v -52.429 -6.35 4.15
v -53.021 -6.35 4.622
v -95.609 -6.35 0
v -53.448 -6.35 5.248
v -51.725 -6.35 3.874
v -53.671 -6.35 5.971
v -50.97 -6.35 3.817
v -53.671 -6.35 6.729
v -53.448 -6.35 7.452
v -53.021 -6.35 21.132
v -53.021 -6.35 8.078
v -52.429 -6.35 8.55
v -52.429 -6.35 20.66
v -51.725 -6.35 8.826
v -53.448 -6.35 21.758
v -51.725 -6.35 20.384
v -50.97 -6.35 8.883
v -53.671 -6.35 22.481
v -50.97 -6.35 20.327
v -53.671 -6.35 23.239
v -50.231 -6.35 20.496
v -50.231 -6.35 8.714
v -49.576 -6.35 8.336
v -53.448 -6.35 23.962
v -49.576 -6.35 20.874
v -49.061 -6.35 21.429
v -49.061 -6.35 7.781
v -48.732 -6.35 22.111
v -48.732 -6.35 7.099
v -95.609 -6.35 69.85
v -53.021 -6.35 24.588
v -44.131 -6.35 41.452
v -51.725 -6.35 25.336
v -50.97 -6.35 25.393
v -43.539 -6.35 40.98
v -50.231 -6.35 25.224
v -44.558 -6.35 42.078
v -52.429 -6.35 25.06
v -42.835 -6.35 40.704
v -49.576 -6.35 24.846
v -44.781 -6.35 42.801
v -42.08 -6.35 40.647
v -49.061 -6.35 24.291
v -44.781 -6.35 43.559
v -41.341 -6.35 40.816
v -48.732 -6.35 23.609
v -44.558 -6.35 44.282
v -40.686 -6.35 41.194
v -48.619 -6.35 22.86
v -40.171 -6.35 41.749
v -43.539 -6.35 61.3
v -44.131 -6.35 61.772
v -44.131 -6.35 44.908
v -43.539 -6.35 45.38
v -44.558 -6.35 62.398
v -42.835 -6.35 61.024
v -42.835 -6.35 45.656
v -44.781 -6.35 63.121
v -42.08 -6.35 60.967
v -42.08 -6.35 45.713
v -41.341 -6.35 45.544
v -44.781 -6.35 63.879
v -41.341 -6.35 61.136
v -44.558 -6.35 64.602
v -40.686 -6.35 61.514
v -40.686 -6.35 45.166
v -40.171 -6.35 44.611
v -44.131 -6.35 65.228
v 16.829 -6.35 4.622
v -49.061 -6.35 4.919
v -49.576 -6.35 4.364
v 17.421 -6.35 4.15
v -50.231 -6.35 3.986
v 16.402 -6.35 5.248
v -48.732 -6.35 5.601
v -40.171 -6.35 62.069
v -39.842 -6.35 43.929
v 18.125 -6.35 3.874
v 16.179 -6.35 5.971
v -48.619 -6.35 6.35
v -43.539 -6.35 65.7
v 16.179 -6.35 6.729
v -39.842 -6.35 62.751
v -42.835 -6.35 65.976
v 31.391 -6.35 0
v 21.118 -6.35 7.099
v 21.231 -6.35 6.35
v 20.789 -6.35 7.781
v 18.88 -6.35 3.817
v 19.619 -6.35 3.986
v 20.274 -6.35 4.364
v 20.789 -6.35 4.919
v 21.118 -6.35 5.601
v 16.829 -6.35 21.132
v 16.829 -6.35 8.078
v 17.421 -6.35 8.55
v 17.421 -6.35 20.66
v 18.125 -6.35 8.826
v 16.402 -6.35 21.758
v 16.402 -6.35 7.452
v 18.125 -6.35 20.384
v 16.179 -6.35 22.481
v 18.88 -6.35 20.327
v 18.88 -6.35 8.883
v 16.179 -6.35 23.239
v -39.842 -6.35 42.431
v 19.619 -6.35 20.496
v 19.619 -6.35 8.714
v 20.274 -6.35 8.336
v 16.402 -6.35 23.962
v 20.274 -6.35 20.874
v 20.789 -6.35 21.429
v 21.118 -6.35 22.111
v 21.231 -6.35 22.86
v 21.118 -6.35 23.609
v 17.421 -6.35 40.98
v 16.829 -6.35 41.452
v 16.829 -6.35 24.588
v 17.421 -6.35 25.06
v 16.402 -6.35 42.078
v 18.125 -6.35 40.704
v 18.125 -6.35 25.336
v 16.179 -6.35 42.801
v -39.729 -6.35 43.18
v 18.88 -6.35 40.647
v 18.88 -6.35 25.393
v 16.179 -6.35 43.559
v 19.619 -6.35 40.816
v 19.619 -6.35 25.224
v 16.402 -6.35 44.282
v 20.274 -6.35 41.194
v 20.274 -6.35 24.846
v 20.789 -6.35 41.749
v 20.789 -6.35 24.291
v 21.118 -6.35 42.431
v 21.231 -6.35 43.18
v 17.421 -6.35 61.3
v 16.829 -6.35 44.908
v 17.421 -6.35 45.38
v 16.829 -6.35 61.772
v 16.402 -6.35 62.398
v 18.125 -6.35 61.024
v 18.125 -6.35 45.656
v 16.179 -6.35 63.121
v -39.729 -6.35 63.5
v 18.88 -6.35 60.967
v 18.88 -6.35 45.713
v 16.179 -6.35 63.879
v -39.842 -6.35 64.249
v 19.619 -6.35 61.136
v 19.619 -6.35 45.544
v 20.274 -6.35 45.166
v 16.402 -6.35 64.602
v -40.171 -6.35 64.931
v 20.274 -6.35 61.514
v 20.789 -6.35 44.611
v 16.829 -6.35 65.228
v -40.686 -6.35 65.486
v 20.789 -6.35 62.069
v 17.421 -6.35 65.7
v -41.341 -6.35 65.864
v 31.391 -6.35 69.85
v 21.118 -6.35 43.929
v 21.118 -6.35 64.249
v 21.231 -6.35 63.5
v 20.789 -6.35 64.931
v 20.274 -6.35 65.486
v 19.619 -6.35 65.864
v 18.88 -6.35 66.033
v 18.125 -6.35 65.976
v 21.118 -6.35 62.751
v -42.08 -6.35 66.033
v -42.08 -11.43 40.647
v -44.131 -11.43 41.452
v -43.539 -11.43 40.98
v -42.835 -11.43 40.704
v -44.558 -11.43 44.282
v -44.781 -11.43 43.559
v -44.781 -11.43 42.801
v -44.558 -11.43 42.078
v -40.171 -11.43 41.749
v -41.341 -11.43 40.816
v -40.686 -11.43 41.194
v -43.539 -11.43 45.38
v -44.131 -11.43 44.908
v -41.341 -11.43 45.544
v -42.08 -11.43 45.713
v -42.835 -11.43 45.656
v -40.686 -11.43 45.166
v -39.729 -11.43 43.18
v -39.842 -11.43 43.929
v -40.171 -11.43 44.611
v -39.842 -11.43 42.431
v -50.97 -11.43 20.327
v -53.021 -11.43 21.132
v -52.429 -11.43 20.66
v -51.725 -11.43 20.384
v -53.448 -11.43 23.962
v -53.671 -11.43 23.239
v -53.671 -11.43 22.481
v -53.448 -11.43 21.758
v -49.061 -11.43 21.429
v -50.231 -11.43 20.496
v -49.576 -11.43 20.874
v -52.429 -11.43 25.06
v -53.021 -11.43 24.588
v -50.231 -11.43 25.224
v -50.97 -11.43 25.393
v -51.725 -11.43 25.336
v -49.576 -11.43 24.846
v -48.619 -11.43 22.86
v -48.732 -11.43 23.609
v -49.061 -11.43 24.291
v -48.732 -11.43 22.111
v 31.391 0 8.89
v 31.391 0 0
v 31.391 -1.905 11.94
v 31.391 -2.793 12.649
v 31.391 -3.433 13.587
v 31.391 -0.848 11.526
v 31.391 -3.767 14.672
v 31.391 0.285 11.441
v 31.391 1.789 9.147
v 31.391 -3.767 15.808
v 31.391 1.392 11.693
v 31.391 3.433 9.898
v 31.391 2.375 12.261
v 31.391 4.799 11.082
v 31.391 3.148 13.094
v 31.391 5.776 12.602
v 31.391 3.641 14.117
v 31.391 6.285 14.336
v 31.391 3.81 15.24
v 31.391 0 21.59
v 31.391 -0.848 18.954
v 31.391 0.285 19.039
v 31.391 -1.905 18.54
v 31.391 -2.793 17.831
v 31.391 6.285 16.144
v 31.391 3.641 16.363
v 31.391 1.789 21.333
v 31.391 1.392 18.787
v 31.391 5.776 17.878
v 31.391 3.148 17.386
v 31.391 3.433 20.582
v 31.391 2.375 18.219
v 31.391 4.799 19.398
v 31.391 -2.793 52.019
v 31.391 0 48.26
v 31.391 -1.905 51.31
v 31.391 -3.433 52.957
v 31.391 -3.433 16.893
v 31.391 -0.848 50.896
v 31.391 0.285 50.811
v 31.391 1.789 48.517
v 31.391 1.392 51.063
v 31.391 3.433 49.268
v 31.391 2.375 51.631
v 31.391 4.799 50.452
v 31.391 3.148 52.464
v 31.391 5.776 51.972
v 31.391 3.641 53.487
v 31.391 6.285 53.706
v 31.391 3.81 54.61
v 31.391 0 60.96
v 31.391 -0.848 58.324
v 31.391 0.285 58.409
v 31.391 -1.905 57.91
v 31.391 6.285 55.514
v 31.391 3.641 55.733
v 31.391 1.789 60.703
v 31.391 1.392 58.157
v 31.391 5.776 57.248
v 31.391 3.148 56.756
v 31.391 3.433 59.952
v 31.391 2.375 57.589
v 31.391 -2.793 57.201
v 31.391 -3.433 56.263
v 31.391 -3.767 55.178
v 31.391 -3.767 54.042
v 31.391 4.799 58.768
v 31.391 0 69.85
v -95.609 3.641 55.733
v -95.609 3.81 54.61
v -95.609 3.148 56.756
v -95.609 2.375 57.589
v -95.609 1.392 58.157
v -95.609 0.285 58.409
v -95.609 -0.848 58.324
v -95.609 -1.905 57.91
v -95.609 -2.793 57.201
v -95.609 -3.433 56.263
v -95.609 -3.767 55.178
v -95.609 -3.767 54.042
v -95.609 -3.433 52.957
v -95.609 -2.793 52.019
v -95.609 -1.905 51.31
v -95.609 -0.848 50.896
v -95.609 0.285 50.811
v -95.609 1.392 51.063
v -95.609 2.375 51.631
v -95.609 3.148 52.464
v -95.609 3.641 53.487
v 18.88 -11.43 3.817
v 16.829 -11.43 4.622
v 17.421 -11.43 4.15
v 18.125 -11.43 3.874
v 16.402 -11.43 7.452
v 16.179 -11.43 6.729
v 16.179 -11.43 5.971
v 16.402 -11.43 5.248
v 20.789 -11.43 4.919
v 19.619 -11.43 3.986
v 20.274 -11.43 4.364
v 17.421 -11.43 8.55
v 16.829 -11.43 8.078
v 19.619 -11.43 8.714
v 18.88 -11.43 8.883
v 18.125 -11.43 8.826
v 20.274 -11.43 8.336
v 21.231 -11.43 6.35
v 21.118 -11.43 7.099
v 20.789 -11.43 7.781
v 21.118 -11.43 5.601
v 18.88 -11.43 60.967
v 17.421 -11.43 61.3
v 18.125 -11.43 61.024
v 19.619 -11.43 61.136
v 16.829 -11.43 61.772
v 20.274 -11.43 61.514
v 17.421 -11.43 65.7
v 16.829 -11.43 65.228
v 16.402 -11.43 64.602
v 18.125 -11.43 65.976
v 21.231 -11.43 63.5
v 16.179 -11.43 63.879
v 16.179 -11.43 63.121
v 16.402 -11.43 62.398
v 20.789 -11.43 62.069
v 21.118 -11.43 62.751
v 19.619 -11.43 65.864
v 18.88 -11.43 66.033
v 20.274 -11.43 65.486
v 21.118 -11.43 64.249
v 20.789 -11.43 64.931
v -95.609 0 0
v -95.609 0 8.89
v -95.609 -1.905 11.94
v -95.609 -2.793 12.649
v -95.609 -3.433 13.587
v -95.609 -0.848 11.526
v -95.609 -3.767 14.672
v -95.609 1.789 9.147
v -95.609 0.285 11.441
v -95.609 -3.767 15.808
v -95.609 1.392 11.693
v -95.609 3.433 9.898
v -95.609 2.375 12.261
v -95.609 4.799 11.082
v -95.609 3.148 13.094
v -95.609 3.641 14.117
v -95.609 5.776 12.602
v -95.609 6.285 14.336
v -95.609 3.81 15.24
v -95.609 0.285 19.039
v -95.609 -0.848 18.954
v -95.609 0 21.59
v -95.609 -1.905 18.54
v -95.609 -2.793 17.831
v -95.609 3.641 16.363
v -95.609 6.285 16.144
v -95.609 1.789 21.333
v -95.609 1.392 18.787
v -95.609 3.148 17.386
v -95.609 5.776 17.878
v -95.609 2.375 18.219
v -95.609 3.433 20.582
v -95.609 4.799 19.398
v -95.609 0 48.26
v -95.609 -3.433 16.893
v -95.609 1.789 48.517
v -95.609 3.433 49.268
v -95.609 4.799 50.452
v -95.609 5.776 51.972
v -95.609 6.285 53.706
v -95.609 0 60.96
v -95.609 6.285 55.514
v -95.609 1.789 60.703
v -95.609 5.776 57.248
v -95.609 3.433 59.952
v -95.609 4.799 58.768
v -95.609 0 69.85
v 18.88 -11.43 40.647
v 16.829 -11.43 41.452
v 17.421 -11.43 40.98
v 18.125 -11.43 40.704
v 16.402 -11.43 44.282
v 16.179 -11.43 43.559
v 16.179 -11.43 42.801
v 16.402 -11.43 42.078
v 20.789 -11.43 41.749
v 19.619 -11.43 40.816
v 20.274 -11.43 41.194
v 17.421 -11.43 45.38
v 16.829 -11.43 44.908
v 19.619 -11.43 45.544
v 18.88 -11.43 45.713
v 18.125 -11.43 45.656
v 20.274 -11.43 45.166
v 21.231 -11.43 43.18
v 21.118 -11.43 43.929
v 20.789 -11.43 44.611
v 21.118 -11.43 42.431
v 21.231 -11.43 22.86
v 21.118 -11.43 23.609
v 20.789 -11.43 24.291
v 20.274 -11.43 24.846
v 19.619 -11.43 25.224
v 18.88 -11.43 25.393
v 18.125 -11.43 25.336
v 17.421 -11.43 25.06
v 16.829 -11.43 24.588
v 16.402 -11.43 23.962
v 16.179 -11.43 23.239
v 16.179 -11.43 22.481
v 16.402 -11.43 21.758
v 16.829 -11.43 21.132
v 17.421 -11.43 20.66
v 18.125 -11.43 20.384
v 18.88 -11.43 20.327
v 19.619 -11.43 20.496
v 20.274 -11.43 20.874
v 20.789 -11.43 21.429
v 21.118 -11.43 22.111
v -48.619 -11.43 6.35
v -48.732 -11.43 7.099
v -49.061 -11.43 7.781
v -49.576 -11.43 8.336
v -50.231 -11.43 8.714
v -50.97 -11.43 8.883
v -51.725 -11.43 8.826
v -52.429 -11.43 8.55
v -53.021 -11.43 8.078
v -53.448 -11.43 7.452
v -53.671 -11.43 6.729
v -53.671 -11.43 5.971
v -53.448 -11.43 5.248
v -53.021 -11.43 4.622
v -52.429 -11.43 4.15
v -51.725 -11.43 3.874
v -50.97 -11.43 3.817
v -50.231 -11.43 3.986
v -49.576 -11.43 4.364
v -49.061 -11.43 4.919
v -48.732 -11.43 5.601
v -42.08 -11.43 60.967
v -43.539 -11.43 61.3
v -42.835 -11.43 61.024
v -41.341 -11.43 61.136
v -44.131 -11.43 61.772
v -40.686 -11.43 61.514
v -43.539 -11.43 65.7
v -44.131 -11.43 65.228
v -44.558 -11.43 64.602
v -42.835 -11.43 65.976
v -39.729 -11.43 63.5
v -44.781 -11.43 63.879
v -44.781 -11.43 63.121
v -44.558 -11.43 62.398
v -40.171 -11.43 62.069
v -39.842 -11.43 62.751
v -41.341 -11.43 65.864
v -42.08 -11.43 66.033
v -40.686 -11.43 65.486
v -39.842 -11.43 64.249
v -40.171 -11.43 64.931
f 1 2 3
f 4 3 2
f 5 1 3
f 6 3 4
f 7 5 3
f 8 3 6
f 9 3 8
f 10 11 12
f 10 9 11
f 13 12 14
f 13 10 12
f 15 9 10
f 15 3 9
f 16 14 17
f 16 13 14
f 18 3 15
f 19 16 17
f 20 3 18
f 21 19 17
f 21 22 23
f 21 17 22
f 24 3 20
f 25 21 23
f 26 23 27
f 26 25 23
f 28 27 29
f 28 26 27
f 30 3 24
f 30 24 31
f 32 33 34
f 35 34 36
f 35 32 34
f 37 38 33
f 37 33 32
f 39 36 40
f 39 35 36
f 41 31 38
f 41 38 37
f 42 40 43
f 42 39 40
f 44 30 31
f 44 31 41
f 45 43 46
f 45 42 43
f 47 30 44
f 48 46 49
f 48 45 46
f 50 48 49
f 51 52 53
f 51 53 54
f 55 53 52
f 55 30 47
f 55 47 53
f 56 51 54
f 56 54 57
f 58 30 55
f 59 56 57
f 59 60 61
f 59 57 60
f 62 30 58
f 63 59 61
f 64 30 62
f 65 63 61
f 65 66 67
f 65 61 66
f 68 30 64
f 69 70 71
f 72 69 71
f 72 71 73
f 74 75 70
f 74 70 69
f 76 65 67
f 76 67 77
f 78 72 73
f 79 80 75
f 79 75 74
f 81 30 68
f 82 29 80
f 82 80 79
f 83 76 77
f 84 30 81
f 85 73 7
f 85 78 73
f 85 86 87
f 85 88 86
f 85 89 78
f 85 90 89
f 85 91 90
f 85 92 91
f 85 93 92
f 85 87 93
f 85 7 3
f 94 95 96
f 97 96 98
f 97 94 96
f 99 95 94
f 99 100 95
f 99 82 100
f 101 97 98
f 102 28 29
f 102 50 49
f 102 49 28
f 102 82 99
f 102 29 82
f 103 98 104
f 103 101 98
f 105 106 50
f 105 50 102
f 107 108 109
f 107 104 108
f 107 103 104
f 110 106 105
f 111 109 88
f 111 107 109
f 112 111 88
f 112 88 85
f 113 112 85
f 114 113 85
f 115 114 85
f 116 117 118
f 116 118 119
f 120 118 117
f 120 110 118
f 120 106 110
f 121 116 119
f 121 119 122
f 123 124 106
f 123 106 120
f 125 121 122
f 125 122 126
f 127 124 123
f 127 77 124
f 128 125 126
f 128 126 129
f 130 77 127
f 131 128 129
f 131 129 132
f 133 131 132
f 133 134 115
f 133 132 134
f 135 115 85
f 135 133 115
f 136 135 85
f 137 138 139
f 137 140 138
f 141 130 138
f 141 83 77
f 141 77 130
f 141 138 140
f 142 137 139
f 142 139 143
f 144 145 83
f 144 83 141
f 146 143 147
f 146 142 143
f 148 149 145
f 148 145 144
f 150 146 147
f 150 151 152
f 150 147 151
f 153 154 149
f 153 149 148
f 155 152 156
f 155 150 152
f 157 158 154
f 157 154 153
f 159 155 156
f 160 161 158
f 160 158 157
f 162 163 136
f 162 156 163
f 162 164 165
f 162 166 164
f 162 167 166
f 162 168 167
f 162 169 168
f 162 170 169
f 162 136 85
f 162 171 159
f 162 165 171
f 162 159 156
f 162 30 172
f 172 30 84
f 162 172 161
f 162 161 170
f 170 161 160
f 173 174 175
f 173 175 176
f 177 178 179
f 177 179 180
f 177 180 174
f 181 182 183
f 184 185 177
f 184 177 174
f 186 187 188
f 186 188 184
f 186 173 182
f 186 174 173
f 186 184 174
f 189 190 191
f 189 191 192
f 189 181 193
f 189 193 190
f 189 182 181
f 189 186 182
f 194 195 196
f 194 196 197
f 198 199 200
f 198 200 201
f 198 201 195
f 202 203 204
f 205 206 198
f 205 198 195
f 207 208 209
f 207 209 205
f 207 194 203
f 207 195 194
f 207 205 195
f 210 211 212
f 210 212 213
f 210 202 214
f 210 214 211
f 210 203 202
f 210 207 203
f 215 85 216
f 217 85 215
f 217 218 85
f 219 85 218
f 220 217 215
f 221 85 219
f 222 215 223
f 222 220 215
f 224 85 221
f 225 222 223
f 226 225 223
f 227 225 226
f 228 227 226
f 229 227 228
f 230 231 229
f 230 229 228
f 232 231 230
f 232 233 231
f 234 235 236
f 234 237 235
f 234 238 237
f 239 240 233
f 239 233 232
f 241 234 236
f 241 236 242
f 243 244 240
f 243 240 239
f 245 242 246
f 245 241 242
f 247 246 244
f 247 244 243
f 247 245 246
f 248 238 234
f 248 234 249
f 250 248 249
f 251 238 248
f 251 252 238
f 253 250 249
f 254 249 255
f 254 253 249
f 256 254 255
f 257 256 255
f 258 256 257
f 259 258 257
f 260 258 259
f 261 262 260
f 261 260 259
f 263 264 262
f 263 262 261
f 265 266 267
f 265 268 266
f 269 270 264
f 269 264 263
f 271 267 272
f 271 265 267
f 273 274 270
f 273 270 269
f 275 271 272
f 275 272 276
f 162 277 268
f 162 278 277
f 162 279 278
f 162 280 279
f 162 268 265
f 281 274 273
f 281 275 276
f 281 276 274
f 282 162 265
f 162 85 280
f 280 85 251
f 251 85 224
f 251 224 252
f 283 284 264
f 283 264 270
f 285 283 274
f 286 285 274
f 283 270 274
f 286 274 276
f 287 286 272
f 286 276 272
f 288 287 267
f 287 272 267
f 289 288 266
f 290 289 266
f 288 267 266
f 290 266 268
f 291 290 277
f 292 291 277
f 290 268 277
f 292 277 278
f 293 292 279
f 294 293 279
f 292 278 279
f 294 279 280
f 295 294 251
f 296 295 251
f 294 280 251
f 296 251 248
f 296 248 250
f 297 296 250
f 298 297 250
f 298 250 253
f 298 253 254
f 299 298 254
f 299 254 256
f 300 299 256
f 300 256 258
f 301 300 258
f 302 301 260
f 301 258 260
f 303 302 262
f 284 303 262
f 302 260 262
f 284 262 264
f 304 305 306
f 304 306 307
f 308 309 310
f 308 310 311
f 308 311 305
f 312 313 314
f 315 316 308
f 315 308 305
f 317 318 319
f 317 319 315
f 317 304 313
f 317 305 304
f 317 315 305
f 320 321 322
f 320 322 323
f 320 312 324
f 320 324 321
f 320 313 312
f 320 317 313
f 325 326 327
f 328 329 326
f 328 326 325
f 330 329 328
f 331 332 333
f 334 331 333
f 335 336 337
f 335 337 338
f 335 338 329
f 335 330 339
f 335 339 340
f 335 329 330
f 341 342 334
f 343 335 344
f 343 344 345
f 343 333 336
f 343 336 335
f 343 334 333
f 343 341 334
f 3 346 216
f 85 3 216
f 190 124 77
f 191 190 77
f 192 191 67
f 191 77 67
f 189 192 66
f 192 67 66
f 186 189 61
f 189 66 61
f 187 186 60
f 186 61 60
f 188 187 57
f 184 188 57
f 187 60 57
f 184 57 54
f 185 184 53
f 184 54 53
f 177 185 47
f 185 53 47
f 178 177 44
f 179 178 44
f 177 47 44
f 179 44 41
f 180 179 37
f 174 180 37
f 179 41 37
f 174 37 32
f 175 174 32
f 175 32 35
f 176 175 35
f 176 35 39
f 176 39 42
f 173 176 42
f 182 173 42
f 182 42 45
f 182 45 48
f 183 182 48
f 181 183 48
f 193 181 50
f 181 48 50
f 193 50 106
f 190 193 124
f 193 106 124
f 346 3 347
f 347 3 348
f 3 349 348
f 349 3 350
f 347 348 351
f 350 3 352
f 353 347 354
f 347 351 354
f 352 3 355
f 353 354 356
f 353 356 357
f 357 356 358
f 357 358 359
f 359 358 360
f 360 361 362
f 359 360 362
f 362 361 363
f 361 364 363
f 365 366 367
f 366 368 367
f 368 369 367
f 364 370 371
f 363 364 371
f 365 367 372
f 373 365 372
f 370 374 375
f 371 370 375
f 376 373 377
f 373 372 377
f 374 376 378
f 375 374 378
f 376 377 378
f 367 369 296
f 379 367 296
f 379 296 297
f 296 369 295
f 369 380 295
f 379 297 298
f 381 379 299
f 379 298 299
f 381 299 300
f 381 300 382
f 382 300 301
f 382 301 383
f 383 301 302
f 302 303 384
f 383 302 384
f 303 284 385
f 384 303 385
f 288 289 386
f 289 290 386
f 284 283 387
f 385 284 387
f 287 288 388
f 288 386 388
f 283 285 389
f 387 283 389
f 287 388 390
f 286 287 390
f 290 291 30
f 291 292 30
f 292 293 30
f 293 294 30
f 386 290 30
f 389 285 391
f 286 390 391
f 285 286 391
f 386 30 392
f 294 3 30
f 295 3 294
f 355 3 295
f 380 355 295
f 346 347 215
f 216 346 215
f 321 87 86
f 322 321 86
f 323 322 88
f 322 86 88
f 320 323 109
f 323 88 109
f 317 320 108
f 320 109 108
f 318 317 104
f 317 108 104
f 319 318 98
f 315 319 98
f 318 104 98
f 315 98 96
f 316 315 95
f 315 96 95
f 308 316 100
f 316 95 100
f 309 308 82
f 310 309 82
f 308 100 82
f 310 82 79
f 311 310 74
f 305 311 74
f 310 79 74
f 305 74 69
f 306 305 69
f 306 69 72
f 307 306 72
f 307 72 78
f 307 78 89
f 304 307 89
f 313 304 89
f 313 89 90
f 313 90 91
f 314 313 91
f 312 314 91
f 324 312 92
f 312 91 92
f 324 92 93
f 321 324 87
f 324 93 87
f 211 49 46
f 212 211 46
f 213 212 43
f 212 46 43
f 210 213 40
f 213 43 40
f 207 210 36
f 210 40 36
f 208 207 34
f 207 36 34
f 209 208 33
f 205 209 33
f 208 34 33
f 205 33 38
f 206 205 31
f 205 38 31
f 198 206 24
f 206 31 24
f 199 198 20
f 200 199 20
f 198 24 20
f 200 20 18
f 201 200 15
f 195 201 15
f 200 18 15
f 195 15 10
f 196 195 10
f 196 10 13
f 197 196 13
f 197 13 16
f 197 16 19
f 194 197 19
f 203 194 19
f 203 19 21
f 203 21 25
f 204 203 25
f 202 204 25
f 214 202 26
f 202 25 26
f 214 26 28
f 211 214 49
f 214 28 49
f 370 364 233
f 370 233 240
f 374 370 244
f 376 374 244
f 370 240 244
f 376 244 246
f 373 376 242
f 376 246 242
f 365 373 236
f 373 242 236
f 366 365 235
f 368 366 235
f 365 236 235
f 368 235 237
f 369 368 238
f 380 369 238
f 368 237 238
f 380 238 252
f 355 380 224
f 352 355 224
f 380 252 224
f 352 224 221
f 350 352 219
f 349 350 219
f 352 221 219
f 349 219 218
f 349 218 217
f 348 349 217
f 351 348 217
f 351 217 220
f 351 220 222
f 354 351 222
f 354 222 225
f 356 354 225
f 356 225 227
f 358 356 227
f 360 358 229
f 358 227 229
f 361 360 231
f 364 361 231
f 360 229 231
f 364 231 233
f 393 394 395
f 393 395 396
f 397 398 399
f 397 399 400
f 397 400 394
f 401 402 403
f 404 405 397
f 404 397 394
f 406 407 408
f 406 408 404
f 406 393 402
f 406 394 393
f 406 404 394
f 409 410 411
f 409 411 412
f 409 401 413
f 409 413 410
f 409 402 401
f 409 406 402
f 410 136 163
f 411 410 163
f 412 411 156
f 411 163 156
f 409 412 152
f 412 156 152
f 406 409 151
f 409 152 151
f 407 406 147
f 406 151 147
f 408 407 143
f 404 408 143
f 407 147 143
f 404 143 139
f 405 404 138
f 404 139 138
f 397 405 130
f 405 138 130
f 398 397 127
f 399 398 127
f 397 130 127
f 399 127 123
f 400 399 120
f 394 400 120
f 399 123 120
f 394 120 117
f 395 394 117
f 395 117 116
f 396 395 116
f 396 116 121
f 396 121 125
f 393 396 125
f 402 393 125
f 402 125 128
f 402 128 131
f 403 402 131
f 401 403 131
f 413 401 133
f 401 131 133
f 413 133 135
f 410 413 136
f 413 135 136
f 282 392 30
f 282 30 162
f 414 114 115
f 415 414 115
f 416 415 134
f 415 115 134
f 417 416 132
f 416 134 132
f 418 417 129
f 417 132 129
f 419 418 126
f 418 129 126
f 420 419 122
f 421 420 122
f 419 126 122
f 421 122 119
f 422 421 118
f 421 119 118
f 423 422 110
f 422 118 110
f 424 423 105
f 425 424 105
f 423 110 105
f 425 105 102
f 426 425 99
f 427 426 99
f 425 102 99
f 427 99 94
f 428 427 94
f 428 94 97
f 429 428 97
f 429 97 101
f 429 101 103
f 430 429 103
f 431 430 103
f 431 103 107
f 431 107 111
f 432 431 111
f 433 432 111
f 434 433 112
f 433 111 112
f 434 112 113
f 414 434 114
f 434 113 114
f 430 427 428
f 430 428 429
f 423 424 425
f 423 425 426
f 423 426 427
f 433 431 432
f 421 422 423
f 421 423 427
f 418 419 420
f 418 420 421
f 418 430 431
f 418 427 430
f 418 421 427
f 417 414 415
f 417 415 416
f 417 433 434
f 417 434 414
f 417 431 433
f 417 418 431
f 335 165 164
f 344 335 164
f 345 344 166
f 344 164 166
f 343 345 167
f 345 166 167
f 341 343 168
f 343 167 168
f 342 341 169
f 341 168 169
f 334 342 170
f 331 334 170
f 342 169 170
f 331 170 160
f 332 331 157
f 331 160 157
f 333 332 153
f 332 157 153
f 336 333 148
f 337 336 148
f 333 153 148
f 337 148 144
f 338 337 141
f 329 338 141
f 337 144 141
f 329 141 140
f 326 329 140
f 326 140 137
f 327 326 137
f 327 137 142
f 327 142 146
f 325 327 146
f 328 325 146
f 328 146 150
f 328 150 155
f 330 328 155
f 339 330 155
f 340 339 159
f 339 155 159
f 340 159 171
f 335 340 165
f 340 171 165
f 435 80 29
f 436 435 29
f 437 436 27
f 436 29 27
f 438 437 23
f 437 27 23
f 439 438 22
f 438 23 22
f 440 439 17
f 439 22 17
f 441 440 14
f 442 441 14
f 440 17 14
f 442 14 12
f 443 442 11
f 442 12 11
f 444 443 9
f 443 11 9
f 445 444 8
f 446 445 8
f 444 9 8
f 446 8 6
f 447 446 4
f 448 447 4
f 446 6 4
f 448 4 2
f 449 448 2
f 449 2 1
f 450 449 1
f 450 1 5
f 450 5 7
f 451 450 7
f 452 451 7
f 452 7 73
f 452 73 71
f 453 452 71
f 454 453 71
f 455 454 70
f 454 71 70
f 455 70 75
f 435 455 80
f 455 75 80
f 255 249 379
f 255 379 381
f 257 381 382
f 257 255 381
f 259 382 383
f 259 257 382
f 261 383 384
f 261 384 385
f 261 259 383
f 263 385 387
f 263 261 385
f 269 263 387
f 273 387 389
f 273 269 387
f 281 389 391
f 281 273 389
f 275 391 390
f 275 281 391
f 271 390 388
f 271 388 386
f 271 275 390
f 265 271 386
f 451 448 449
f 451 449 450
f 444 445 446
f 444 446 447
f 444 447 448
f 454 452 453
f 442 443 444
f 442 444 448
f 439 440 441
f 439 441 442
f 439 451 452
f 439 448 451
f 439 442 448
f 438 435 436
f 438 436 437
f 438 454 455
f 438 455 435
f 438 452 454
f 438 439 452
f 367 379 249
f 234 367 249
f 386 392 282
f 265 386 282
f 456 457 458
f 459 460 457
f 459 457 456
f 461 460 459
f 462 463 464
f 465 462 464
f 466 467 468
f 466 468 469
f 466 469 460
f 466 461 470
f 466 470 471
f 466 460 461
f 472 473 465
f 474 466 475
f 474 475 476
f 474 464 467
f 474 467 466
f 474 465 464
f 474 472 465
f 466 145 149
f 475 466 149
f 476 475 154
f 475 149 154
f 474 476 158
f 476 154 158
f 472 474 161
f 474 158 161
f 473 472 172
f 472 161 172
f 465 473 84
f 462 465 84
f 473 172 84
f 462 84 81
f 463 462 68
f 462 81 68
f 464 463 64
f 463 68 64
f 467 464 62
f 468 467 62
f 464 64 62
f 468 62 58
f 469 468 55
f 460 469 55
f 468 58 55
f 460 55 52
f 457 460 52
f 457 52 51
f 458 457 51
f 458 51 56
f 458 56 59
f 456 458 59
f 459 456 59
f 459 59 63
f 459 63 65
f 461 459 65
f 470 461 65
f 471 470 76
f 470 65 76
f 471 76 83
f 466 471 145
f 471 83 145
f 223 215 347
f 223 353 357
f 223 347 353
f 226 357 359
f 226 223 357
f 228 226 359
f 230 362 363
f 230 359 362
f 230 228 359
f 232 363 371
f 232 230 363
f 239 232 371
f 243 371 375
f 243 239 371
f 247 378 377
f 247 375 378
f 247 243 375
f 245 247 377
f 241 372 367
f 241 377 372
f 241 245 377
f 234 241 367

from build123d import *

# Parameters (mm, degrees)
F6_W     = 127
F6_H     = 69.85
F0_DEPTH = 6.35
F1_R     = 6.35
F2_DEPTH = 127
F7_R     = 3.81
F8_DEPTH = 127
F3_R     = 2.54
F4_DEPTH = 5.08
F9_R     = 2.54
F5_DEPTH = 5.08


with BuildPart() as f0:
    # F6 (on Front) → F0 (new body)
    with BuildSketch(Plane.XZ):
        with Locations((-32.109398, 34.925)):
            Rectangle(F6_W, F6_H)
    extrude(amount=F0_DEPTH)

    # F1 (on face) → F2 (join)
    with BuildSketch(Plane.YZ.offset(31.390602)):
        with Locations((0, 54.61)):
            Circle(F1_R)
        with Locations((0, 15.24)):
            Circle(F1_R)
    extrude(amount=-F2_DEPTH)

    # F7 (on face) → F8 (cut)
    with BuildSketch(Plane.YZ.offset(31.390602)):
        with Locations((0, 54.61)):
            Circle(F7_R)
        with Locations((0, 15.24)):
            Circle(F7_R)
    extrude(amount=-F8_DEPTH, mode=Mode.SUBTRACT)

    # F3 (on face) → F4 (join)
    with BuildSketch(Plane.XZ.offset(6.35)):
        with Locations((-51.159398, 6.35)):
            Circle(F3_R)
        with Locations((-51.159398, 22.86)):
            Circle(F3_R)
        with Locations((18.690602, 6.35)):
            Circle(F3_R)
        with Locations((18.690602, 22.86)):
            Circle(F3_R)
    extrude(amount=F4_DEPTH)

    # F9 (on face) → F5 (join)
    with BuildSketch(Plane.XZ.offset(6.35)):
        with Locations((-42.269398, 43.18)):
            Circle(F9_R)
        with Locations((-42.269398, 63.5)):
            Circle(F9_R)
        with Locations((18.690602, 43.18)):
            Circle(F9_R)
        with Locations((18.690602, 63.5)):
            Circle(F9_R)
    extrude(amount=F5_DEPTH)


solid = f0.part
